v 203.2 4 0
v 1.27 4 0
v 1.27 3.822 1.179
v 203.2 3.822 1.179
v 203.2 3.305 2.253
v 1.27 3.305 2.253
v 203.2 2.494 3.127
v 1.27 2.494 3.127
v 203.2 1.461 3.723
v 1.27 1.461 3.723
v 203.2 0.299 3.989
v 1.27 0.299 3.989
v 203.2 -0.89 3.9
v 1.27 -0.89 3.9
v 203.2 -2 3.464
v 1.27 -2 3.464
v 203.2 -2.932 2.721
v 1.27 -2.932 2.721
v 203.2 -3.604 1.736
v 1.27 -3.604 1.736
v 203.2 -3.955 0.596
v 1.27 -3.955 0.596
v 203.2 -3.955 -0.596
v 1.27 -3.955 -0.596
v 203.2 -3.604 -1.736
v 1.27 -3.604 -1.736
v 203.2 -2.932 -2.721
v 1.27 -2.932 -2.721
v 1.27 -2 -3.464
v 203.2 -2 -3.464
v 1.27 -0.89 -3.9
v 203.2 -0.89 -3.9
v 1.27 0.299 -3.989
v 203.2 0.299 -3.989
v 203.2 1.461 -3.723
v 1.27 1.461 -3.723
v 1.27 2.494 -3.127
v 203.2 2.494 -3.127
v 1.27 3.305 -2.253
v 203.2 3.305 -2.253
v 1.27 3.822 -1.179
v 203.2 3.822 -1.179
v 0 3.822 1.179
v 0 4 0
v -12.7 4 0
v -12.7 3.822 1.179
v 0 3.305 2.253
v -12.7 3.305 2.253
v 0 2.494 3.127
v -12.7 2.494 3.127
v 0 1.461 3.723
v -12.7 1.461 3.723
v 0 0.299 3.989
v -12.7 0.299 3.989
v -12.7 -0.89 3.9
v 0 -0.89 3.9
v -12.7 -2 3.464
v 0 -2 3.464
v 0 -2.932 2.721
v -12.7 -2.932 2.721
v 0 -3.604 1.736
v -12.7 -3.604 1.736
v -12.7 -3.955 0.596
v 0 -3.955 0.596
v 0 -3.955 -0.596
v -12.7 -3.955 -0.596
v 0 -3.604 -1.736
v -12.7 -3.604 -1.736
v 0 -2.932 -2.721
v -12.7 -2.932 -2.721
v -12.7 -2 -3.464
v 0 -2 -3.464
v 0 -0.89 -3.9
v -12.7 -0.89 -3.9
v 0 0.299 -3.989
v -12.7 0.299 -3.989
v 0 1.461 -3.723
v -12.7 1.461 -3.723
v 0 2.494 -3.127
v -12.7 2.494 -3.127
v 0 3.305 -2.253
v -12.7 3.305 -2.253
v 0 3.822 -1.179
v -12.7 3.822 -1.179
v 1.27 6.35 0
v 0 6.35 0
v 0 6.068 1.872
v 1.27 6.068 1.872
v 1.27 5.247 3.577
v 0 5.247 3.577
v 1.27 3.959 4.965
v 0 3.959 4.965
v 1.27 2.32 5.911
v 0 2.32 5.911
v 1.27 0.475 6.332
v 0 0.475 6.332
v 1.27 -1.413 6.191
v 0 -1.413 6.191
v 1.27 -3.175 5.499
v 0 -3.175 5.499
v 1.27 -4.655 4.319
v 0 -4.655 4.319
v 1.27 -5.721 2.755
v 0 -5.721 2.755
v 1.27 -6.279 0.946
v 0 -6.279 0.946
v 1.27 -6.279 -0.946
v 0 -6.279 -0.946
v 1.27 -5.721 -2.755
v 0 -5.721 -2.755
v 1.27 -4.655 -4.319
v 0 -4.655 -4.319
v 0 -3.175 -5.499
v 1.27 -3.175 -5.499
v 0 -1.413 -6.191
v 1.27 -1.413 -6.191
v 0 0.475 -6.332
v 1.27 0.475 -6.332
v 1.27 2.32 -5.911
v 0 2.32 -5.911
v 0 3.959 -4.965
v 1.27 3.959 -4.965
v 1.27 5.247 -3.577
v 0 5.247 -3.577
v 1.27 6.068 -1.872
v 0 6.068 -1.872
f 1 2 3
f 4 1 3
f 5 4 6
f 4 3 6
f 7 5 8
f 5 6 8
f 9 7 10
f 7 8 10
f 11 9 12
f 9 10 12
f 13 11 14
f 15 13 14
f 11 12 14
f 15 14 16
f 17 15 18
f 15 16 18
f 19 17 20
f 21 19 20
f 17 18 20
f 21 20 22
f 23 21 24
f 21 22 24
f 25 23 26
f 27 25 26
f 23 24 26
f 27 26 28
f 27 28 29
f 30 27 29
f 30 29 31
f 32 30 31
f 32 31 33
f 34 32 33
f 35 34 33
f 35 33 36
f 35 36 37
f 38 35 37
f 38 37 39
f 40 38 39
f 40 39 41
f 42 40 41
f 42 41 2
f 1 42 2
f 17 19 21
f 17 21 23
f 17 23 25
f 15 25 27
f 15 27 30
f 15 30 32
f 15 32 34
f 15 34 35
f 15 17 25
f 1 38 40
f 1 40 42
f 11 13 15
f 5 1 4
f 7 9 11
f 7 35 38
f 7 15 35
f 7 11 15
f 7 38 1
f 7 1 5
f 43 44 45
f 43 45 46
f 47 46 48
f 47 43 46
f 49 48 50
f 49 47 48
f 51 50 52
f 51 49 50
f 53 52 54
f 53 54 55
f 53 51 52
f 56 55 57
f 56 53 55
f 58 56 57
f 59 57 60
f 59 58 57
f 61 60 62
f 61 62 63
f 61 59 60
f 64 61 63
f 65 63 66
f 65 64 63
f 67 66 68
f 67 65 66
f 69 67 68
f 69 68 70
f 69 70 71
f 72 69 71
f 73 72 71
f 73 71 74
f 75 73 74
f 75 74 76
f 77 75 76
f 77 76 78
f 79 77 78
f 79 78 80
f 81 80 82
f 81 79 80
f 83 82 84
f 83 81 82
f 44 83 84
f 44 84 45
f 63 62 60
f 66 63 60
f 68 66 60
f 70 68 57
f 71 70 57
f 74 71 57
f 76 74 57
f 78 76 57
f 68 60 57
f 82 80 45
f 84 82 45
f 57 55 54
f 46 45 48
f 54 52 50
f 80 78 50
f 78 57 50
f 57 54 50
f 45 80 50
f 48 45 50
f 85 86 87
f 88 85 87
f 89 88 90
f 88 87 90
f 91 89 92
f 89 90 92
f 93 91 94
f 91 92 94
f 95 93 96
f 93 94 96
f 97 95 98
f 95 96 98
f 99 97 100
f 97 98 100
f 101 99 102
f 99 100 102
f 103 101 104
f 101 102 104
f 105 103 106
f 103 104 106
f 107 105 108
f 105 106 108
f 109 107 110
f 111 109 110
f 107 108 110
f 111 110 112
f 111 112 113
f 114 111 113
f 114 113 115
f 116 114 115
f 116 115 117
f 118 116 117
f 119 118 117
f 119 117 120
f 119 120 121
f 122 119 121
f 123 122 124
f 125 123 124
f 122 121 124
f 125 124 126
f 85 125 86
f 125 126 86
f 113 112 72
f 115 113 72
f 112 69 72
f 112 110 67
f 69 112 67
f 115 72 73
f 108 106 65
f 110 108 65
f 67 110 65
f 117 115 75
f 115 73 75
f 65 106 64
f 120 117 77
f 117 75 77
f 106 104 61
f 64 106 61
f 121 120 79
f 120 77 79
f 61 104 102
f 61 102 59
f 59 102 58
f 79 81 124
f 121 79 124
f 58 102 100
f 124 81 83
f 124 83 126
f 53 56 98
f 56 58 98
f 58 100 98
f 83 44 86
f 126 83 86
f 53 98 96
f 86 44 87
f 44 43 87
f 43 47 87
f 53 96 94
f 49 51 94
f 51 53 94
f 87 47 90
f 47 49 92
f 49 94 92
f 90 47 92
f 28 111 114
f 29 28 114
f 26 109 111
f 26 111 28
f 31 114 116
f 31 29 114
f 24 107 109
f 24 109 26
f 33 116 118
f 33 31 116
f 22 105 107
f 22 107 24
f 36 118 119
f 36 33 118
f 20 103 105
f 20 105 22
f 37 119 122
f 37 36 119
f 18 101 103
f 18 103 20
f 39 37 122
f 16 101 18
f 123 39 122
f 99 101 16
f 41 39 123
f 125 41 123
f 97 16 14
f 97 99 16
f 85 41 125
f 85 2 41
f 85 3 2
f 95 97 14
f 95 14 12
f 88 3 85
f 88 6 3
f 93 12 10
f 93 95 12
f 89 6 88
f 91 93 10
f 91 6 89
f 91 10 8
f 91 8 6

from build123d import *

# Parameters (mm, degrees)
F0_R     = 4
F1_DEPTH = 203.2
F2_R     = 6.35
F3_DEPTH = 1.27
F4_R     = 4
F5_DEPTH = 12.7


with BuildPart() as f1:
    # F0 (on Right) → F1 (new body)
    with BuildSketch(Plane.YZ):
        Circle(F0_R)
    extrude(amount=F1_DEPTH)

    # F2 (on Right) → F3 (join)
    with BuildSketch(Plane.YZ):
        Circle(F2_R)
    extrude(amount=F3_DEPTH)

    # F4 (on Right) → F5 (join)
    with BuildSketch(Plane.YZ):
        Circle(F4_R)
    extrude(amount=-F5_DEPTH)


solid = f1.part
